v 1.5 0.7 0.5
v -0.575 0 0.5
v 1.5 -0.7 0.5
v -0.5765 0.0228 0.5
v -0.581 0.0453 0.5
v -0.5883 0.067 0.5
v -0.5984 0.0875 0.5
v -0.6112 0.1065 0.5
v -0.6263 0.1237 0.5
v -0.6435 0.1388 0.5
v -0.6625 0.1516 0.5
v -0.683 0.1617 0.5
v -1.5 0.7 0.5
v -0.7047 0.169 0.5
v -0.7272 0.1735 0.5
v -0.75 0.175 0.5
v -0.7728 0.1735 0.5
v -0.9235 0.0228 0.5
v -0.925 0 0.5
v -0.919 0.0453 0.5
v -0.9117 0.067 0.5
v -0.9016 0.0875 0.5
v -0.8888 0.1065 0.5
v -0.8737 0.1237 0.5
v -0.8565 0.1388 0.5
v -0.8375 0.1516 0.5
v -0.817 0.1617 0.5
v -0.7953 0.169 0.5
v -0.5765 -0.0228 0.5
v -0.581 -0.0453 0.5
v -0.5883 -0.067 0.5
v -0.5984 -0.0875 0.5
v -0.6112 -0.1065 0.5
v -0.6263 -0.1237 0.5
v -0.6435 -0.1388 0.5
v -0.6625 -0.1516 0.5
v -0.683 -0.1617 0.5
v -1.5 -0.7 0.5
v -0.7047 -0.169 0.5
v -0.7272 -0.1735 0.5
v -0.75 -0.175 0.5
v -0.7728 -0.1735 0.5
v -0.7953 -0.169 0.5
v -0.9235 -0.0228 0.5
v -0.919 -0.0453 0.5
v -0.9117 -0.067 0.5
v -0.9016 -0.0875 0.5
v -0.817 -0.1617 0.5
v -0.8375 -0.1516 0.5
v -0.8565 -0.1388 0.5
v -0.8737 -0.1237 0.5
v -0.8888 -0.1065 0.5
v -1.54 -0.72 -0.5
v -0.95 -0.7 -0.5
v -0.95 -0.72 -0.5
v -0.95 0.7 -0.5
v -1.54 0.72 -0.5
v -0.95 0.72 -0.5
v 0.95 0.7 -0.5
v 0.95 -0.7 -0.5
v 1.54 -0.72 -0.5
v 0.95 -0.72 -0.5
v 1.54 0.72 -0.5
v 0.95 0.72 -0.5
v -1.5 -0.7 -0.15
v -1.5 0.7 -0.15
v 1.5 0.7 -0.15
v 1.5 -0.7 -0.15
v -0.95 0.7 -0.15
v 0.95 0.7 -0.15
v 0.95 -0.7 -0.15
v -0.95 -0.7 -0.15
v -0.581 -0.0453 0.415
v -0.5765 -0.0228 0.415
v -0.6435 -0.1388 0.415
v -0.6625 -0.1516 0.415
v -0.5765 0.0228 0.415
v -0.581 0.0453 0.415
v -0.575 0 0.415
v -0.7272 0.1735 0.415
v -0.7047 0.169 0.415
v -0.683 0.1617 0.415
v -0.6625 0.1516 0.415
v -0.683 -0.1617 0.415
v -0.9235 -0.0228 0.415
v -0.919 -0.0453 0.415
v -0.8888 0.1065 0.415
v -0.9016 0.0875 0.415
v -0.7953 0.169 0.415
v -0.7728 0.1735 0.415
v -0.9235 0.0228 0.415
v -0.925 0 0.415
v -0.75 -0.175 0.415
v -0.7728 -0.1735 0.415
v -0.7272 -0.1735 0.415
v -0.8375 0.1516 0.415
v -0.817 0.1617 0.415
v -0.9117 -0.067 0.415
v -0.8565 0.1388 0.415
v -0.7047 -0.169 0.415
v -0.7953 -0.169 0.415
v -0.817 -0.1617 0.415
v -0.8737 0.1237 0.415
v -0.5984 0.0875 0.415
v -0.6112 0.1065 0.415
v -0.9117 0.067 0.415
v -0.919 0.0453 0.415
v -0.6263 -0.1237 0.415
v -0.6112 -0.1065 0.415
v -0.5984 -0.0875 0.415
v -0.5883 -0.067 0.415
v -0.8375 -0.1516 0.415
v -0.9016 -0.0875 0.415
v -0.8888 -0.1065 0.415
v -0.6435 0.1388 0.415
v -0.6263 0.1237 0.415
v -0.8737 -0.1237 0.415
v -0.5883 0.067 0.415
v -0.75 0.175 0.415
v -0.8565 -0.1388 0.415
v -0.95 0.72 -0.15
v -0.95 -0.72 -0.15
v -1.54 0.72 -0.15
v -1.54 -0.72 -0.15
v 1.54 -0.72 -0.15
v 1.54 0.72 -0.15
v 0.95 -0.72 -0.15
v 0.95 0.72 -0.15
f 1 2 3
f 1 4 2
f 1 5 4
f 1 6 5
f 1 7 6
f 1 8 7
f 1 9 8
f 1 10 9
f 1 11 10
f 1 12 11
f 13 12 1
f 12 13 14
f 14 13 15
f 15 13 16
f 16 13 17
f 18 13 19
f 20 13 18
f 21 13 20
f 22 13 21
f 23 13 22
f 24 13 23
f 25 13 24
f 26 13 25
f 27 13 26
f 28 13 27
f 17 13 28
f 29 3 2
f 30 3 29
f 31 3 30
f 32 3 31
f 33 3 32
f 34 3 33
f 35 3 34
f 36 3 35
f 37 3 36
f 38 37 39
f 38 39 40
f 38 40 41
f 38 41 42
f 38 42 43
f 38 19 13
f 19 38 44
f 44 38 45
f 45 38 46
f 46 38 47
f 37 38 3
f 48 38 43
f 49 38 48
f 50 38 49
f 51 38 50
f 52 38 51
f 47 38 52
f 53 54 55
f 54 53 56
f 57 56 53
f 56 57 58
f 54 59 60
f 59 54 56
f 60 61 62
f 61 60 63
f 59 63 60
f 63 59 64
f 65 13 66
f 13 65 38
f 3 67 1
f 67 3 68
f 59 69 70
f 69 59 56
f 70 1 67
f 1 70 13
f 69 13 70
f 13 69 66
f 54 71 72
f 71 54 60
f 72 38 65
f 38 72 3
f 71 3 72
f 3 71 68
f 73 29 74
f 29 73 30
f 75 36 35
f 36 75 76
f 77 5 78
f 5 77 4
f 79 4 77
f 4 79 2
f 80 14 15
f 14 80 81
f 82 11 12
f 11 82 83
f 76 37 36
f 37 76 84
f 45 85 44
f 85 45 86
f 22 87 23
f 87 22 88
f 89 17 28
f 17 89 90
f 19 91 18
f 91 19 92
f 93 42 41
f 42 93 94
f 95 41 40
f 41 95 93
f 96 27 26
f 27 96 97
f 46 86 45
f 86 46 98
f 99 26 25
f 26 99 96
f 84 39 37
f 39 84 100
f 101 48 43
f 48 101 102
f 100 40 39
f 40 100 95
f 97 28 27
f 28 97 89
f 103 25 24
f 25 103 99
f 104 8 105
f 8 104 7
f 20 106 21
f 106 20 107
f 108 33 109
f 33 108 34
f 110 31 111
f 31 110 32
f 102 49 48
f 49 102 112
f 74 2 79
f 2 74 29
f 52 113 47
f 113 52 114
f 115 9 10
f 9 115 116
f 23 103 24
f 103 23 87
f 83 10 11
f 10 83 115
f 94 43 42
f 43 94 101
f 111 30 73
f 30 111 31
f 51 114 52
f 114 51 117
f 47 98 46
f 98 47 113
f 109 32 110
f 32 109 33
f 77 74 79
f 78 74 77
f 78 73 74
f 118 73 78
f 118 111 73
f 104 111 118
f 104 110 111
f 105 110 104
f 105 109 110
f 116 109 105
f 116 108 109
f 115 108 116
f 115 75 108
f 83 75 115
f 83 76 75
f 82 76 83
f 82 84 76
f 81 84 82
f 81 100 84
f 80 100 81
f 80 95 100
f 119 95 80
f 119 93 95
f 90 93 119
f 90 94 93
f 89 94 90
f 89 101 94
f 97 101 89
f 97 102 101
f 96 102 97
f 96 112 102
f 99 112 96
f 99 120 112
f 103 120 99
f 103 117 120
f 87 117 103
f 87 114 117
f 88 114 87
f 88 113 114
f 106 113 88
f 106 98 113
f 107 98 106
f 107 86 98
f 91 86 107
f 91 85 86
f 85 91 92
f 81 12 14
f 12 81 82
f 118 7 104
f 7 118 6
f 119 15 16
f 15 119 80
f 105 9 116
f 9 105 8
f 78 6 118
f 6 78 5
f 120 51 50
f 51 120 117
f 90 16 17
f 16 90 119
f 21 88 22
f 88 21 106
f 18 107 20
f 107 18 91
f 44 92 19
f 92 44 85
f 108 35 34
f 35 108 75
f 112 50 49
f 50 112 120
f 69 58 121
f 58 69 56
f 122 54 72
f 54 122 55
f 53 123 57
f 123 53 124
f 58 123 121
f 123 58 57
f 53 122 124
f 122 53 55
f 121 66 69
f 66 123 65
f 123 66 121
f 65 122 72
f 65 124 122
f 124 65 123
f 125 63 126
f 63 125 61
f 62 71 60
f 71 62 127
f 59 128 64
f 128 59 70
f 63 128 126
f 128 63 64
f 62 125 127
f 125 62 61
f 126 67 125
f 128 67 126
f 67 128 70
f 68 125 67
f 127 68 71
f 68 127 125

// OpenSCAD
$fn = 48;

// Target overall size (A smd): [3, 1.4, 1.0]
length = 3.0;
width  = 1.4;
height = 1.0;

// Feature sizes
terminal_height = 0.22;          // bottom metallization thickness
terminal_length = 0.55;          // end termination length along X
polarity_mark_diameter = 0.35;   // small top dimple
polarity_mark_depth = 0.08;

chamfer = 0.12;                  // corner chamfer amount
eps = 0.01;

// Chamfered body using hull of 4 corner posts (keeps it a single solid)
module chamfered_body(L, W, H, c) {
    c2 = min(c, min(L, W)/2 - 0.001);
    hull() {
        for (sx = [-1, 1])
            for (sy = [-1, 1])
                translate([sx*(L/2 - c2), sy*(W/2 - c2), 0])
                    cube([2*c2, 2*c2, H], center=true);
    }
}

// End terminations: wrap bottom + a bit up the sides, connected with overlap
module terminations(L, W, H, tL, tH) {
    side_up = min(0.35, H*0.45); // how far up the sides the metal wraps
    overlap = 0.02;

    for (sx = [-1, 1]) {
        // Bottom pad at each end
        translate([sx*(L/2 - tL/2 + overlap), 0, -H/2 + tH/2 + overlap])
            cube([tL + 2*overlap, W + 2*overlap, tH + 2*overlap], center=true);

        // Side wrap (vertical band) at each end
        translate([sx*(L/2 - tL/2 + overlap), 0, -H/2 + side_up/2])
            cube([tL + 2*overlap, W + 2*overlap, side_up], center=true);
    }
}

// Polarity mark as a shallow dimple on top (subtracted), stays within body
module polarity_dimple(L, W, H, d, depth) {
    translate([-L/4, 0, H/2 - depth/2])
        cylinder(h=depth + eps, d=d, center=true);
}

module smd_component() {
    union() {
        // Main body with chamfered corners and a polarity dimple
        difference() {
            chamfered_body(length, width, height, chamfer);
            polarity_dimple(length, width, height, polarity_mark_diameter, polarity_mark_depth);
        }

        // Terminations (connected to body with slight overlap)
        terminations(length, width, height, terminal_length, terminal_height);
    }
}

smd_component();
